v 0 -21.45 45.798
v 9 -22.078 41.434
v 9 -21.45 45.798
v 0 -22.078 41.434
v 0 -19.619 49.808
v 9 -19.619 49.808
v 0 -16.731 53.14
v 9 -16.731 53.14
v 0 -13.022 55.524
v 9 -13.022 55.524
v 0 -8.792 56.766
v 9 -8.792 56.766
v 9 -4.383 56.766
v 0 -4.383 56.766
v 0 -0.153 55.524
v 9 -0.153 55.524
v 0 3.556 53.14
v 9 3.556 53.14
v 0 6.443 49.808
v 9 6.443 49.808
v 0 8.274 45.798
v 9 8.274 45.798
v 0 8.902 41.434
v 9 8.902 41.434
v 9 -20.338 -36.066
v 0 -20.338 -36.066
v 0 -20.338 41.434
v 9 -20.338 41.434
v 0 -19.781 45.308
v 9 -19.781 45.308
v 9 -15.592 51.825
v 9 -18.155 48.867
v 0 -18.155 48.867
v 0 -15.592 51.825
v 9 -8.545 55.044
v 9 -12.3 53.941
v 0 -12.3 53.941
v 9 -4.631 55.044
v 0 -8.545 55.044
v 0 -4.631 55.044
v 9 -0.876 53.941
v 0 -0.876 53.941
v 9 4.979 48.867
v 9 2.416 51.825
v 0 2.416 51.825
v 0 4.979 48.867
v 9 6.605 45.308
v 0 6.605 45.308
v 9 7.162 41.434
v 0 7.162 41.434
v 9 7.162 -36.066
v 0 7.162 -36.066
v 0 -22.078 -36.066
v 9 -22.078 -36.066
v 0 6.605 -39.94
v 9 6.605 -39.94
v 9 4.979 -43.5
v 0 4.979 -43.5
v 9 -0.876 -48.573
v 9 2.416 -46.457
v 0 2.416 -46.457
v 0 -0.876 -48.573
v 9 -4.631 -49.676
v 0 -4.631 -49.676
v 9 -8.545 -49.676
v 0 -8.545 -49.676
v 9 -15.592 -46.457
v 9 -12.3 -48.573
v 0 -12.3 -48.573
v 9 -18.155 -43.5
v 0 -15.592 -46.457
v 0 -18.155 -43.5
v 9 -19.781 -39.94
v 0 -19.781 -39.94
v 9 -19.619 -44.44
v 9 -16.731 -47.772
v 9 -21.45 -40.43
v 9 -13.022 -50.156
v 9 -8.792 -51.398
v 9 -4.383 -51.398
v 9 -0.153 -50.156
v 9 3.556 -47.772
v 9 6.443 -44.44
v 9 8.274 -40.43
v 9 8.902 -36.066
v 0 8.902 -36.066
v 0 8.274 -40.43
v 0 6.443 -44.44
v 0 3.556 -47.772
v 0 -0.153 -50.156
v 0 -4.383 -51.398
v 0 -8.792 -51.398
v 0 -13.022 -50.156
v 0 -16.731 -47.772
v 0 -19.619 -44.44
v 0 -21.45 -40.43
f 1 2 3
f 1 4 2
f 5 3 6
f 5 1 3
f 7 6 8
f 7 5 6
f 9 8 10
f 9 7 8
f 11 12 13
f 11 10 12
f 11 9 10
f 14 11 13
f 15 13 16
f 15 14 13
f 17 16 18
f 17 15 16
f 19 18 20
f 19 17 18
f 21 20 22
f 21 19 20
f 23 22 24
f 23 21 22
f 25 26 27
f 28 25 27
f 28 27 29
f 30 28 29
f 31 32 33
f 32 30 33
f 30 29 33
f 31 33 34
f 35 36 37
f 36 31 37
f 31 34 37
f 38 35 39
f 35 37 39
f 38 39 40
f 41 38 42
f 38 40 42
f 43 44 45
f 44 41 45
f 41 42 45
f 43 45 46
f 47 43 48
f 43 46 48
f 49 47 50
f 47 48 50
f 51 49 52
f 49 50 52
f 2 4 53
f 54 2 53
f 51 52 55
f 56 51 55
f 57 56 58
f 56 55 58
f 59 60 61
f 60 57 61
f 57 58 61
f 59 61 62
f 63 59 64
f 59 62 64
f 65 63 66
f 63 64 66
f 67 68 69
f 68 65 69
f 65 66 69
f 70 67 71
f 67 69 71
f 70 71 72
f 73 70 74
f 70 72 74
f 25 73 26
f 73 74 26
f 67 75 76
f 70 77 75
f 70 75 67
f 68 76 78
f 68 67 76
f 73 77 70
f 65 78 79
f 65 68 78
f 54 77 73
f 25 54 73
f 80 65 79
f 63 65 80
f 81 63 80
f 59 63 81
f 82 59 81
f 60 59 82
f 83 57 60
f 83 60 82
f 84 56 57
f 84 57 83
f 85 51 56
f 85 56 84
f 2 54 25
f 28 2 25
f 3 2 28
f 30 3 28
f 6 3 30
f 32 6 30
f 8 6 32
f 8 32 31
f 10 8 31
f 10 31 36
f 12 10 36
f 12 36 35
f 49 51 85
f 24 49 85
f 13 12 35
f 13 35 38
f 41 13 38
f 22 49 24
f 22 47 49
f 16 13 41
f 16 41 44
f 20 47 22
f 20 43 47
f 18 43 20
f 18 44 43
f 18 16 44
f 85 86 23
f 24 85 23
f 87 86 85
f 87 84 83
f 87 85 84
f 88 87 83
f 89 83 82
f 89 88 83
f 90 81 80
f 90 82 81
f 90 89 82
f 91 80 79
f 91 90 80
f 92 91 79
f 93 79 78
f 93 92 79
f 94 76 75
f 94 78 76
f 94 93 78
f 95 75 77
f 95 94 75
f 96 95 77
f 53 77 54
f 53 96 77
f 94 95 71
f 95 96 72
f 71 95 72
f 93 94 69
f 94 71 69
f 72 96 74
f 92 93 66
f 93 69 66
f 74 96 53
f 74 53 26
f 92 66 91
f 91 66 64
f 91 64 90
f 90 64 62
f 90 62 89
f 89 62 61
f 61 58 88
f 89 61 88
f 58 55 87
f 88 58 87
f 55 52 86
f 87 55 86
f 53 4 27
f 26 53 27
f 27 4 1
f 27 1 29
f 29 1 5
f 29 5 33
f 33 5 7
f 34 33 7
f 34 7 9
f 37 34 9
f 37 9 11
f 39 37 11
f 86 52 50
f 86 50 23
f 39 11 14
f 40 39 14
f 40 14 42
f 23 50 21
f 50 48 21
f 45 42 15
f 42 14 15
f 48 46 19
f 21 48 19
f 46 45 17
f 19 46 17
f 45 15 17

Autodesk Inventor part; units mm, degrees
ref_plane "YZ Plane" through (0, 0, 0) normal (1, 0, 0) x (0, 1, 0)
ref_plane "XZ Plane" through (0, 0, 0) normal (0, 1, 0) x (-1, 0, 0)
ref_plane "XY Plane" through (0, 0, 0) normal (0, 0, 1) x (1, 0, 0)
sketch "Sketch1" plane through (0, 0, 0) normal (1, 0, 0) x (0, 1, 0)
  arc A0 (7.1618, 41.4339) -> (-20.3375, 41.4339) centre (-6.5878, 41.4339) ccw
  arc A1 (-20.3375, -36.0661) -> (7.1618, -36.0661) centre (-6.5878, -36.0661) ccw
  line L0 (7.1618, 41.4339) -> (7.1618, -36.0661)
  line L1 (-20.3375, -36.0661) -> (-20.3375, 41.4339)
  line L2 (8.9018, -36.0661) -> (8.9018, 41.4339)
  arc A2 (8.9018, 41.4339) -> (-22.0775, 41.4339) centre (-6.5878, 41.4339) ccw
  line L3 (-22.0775, 41.4339) -> (-22.0775, -36.0661)
  arc A3 (-22.0775, -36.0661) -> (8.9018, -36.0661) centre (-6.5878, -36.0661) ccw
  point P0 (0, 0)
  dimension "d0" = 27.4993
  dimension "d1" = 27.4993
  dimension "d2" = 77.5
  dimension "d3" = 0
  dimension "d4" = 1.74
extrude "Extrusion1" add sketch "Sketch1" along normal blind 9
equation "\"d1\" = d0"
properties part number "49T belt from gobuilda"
